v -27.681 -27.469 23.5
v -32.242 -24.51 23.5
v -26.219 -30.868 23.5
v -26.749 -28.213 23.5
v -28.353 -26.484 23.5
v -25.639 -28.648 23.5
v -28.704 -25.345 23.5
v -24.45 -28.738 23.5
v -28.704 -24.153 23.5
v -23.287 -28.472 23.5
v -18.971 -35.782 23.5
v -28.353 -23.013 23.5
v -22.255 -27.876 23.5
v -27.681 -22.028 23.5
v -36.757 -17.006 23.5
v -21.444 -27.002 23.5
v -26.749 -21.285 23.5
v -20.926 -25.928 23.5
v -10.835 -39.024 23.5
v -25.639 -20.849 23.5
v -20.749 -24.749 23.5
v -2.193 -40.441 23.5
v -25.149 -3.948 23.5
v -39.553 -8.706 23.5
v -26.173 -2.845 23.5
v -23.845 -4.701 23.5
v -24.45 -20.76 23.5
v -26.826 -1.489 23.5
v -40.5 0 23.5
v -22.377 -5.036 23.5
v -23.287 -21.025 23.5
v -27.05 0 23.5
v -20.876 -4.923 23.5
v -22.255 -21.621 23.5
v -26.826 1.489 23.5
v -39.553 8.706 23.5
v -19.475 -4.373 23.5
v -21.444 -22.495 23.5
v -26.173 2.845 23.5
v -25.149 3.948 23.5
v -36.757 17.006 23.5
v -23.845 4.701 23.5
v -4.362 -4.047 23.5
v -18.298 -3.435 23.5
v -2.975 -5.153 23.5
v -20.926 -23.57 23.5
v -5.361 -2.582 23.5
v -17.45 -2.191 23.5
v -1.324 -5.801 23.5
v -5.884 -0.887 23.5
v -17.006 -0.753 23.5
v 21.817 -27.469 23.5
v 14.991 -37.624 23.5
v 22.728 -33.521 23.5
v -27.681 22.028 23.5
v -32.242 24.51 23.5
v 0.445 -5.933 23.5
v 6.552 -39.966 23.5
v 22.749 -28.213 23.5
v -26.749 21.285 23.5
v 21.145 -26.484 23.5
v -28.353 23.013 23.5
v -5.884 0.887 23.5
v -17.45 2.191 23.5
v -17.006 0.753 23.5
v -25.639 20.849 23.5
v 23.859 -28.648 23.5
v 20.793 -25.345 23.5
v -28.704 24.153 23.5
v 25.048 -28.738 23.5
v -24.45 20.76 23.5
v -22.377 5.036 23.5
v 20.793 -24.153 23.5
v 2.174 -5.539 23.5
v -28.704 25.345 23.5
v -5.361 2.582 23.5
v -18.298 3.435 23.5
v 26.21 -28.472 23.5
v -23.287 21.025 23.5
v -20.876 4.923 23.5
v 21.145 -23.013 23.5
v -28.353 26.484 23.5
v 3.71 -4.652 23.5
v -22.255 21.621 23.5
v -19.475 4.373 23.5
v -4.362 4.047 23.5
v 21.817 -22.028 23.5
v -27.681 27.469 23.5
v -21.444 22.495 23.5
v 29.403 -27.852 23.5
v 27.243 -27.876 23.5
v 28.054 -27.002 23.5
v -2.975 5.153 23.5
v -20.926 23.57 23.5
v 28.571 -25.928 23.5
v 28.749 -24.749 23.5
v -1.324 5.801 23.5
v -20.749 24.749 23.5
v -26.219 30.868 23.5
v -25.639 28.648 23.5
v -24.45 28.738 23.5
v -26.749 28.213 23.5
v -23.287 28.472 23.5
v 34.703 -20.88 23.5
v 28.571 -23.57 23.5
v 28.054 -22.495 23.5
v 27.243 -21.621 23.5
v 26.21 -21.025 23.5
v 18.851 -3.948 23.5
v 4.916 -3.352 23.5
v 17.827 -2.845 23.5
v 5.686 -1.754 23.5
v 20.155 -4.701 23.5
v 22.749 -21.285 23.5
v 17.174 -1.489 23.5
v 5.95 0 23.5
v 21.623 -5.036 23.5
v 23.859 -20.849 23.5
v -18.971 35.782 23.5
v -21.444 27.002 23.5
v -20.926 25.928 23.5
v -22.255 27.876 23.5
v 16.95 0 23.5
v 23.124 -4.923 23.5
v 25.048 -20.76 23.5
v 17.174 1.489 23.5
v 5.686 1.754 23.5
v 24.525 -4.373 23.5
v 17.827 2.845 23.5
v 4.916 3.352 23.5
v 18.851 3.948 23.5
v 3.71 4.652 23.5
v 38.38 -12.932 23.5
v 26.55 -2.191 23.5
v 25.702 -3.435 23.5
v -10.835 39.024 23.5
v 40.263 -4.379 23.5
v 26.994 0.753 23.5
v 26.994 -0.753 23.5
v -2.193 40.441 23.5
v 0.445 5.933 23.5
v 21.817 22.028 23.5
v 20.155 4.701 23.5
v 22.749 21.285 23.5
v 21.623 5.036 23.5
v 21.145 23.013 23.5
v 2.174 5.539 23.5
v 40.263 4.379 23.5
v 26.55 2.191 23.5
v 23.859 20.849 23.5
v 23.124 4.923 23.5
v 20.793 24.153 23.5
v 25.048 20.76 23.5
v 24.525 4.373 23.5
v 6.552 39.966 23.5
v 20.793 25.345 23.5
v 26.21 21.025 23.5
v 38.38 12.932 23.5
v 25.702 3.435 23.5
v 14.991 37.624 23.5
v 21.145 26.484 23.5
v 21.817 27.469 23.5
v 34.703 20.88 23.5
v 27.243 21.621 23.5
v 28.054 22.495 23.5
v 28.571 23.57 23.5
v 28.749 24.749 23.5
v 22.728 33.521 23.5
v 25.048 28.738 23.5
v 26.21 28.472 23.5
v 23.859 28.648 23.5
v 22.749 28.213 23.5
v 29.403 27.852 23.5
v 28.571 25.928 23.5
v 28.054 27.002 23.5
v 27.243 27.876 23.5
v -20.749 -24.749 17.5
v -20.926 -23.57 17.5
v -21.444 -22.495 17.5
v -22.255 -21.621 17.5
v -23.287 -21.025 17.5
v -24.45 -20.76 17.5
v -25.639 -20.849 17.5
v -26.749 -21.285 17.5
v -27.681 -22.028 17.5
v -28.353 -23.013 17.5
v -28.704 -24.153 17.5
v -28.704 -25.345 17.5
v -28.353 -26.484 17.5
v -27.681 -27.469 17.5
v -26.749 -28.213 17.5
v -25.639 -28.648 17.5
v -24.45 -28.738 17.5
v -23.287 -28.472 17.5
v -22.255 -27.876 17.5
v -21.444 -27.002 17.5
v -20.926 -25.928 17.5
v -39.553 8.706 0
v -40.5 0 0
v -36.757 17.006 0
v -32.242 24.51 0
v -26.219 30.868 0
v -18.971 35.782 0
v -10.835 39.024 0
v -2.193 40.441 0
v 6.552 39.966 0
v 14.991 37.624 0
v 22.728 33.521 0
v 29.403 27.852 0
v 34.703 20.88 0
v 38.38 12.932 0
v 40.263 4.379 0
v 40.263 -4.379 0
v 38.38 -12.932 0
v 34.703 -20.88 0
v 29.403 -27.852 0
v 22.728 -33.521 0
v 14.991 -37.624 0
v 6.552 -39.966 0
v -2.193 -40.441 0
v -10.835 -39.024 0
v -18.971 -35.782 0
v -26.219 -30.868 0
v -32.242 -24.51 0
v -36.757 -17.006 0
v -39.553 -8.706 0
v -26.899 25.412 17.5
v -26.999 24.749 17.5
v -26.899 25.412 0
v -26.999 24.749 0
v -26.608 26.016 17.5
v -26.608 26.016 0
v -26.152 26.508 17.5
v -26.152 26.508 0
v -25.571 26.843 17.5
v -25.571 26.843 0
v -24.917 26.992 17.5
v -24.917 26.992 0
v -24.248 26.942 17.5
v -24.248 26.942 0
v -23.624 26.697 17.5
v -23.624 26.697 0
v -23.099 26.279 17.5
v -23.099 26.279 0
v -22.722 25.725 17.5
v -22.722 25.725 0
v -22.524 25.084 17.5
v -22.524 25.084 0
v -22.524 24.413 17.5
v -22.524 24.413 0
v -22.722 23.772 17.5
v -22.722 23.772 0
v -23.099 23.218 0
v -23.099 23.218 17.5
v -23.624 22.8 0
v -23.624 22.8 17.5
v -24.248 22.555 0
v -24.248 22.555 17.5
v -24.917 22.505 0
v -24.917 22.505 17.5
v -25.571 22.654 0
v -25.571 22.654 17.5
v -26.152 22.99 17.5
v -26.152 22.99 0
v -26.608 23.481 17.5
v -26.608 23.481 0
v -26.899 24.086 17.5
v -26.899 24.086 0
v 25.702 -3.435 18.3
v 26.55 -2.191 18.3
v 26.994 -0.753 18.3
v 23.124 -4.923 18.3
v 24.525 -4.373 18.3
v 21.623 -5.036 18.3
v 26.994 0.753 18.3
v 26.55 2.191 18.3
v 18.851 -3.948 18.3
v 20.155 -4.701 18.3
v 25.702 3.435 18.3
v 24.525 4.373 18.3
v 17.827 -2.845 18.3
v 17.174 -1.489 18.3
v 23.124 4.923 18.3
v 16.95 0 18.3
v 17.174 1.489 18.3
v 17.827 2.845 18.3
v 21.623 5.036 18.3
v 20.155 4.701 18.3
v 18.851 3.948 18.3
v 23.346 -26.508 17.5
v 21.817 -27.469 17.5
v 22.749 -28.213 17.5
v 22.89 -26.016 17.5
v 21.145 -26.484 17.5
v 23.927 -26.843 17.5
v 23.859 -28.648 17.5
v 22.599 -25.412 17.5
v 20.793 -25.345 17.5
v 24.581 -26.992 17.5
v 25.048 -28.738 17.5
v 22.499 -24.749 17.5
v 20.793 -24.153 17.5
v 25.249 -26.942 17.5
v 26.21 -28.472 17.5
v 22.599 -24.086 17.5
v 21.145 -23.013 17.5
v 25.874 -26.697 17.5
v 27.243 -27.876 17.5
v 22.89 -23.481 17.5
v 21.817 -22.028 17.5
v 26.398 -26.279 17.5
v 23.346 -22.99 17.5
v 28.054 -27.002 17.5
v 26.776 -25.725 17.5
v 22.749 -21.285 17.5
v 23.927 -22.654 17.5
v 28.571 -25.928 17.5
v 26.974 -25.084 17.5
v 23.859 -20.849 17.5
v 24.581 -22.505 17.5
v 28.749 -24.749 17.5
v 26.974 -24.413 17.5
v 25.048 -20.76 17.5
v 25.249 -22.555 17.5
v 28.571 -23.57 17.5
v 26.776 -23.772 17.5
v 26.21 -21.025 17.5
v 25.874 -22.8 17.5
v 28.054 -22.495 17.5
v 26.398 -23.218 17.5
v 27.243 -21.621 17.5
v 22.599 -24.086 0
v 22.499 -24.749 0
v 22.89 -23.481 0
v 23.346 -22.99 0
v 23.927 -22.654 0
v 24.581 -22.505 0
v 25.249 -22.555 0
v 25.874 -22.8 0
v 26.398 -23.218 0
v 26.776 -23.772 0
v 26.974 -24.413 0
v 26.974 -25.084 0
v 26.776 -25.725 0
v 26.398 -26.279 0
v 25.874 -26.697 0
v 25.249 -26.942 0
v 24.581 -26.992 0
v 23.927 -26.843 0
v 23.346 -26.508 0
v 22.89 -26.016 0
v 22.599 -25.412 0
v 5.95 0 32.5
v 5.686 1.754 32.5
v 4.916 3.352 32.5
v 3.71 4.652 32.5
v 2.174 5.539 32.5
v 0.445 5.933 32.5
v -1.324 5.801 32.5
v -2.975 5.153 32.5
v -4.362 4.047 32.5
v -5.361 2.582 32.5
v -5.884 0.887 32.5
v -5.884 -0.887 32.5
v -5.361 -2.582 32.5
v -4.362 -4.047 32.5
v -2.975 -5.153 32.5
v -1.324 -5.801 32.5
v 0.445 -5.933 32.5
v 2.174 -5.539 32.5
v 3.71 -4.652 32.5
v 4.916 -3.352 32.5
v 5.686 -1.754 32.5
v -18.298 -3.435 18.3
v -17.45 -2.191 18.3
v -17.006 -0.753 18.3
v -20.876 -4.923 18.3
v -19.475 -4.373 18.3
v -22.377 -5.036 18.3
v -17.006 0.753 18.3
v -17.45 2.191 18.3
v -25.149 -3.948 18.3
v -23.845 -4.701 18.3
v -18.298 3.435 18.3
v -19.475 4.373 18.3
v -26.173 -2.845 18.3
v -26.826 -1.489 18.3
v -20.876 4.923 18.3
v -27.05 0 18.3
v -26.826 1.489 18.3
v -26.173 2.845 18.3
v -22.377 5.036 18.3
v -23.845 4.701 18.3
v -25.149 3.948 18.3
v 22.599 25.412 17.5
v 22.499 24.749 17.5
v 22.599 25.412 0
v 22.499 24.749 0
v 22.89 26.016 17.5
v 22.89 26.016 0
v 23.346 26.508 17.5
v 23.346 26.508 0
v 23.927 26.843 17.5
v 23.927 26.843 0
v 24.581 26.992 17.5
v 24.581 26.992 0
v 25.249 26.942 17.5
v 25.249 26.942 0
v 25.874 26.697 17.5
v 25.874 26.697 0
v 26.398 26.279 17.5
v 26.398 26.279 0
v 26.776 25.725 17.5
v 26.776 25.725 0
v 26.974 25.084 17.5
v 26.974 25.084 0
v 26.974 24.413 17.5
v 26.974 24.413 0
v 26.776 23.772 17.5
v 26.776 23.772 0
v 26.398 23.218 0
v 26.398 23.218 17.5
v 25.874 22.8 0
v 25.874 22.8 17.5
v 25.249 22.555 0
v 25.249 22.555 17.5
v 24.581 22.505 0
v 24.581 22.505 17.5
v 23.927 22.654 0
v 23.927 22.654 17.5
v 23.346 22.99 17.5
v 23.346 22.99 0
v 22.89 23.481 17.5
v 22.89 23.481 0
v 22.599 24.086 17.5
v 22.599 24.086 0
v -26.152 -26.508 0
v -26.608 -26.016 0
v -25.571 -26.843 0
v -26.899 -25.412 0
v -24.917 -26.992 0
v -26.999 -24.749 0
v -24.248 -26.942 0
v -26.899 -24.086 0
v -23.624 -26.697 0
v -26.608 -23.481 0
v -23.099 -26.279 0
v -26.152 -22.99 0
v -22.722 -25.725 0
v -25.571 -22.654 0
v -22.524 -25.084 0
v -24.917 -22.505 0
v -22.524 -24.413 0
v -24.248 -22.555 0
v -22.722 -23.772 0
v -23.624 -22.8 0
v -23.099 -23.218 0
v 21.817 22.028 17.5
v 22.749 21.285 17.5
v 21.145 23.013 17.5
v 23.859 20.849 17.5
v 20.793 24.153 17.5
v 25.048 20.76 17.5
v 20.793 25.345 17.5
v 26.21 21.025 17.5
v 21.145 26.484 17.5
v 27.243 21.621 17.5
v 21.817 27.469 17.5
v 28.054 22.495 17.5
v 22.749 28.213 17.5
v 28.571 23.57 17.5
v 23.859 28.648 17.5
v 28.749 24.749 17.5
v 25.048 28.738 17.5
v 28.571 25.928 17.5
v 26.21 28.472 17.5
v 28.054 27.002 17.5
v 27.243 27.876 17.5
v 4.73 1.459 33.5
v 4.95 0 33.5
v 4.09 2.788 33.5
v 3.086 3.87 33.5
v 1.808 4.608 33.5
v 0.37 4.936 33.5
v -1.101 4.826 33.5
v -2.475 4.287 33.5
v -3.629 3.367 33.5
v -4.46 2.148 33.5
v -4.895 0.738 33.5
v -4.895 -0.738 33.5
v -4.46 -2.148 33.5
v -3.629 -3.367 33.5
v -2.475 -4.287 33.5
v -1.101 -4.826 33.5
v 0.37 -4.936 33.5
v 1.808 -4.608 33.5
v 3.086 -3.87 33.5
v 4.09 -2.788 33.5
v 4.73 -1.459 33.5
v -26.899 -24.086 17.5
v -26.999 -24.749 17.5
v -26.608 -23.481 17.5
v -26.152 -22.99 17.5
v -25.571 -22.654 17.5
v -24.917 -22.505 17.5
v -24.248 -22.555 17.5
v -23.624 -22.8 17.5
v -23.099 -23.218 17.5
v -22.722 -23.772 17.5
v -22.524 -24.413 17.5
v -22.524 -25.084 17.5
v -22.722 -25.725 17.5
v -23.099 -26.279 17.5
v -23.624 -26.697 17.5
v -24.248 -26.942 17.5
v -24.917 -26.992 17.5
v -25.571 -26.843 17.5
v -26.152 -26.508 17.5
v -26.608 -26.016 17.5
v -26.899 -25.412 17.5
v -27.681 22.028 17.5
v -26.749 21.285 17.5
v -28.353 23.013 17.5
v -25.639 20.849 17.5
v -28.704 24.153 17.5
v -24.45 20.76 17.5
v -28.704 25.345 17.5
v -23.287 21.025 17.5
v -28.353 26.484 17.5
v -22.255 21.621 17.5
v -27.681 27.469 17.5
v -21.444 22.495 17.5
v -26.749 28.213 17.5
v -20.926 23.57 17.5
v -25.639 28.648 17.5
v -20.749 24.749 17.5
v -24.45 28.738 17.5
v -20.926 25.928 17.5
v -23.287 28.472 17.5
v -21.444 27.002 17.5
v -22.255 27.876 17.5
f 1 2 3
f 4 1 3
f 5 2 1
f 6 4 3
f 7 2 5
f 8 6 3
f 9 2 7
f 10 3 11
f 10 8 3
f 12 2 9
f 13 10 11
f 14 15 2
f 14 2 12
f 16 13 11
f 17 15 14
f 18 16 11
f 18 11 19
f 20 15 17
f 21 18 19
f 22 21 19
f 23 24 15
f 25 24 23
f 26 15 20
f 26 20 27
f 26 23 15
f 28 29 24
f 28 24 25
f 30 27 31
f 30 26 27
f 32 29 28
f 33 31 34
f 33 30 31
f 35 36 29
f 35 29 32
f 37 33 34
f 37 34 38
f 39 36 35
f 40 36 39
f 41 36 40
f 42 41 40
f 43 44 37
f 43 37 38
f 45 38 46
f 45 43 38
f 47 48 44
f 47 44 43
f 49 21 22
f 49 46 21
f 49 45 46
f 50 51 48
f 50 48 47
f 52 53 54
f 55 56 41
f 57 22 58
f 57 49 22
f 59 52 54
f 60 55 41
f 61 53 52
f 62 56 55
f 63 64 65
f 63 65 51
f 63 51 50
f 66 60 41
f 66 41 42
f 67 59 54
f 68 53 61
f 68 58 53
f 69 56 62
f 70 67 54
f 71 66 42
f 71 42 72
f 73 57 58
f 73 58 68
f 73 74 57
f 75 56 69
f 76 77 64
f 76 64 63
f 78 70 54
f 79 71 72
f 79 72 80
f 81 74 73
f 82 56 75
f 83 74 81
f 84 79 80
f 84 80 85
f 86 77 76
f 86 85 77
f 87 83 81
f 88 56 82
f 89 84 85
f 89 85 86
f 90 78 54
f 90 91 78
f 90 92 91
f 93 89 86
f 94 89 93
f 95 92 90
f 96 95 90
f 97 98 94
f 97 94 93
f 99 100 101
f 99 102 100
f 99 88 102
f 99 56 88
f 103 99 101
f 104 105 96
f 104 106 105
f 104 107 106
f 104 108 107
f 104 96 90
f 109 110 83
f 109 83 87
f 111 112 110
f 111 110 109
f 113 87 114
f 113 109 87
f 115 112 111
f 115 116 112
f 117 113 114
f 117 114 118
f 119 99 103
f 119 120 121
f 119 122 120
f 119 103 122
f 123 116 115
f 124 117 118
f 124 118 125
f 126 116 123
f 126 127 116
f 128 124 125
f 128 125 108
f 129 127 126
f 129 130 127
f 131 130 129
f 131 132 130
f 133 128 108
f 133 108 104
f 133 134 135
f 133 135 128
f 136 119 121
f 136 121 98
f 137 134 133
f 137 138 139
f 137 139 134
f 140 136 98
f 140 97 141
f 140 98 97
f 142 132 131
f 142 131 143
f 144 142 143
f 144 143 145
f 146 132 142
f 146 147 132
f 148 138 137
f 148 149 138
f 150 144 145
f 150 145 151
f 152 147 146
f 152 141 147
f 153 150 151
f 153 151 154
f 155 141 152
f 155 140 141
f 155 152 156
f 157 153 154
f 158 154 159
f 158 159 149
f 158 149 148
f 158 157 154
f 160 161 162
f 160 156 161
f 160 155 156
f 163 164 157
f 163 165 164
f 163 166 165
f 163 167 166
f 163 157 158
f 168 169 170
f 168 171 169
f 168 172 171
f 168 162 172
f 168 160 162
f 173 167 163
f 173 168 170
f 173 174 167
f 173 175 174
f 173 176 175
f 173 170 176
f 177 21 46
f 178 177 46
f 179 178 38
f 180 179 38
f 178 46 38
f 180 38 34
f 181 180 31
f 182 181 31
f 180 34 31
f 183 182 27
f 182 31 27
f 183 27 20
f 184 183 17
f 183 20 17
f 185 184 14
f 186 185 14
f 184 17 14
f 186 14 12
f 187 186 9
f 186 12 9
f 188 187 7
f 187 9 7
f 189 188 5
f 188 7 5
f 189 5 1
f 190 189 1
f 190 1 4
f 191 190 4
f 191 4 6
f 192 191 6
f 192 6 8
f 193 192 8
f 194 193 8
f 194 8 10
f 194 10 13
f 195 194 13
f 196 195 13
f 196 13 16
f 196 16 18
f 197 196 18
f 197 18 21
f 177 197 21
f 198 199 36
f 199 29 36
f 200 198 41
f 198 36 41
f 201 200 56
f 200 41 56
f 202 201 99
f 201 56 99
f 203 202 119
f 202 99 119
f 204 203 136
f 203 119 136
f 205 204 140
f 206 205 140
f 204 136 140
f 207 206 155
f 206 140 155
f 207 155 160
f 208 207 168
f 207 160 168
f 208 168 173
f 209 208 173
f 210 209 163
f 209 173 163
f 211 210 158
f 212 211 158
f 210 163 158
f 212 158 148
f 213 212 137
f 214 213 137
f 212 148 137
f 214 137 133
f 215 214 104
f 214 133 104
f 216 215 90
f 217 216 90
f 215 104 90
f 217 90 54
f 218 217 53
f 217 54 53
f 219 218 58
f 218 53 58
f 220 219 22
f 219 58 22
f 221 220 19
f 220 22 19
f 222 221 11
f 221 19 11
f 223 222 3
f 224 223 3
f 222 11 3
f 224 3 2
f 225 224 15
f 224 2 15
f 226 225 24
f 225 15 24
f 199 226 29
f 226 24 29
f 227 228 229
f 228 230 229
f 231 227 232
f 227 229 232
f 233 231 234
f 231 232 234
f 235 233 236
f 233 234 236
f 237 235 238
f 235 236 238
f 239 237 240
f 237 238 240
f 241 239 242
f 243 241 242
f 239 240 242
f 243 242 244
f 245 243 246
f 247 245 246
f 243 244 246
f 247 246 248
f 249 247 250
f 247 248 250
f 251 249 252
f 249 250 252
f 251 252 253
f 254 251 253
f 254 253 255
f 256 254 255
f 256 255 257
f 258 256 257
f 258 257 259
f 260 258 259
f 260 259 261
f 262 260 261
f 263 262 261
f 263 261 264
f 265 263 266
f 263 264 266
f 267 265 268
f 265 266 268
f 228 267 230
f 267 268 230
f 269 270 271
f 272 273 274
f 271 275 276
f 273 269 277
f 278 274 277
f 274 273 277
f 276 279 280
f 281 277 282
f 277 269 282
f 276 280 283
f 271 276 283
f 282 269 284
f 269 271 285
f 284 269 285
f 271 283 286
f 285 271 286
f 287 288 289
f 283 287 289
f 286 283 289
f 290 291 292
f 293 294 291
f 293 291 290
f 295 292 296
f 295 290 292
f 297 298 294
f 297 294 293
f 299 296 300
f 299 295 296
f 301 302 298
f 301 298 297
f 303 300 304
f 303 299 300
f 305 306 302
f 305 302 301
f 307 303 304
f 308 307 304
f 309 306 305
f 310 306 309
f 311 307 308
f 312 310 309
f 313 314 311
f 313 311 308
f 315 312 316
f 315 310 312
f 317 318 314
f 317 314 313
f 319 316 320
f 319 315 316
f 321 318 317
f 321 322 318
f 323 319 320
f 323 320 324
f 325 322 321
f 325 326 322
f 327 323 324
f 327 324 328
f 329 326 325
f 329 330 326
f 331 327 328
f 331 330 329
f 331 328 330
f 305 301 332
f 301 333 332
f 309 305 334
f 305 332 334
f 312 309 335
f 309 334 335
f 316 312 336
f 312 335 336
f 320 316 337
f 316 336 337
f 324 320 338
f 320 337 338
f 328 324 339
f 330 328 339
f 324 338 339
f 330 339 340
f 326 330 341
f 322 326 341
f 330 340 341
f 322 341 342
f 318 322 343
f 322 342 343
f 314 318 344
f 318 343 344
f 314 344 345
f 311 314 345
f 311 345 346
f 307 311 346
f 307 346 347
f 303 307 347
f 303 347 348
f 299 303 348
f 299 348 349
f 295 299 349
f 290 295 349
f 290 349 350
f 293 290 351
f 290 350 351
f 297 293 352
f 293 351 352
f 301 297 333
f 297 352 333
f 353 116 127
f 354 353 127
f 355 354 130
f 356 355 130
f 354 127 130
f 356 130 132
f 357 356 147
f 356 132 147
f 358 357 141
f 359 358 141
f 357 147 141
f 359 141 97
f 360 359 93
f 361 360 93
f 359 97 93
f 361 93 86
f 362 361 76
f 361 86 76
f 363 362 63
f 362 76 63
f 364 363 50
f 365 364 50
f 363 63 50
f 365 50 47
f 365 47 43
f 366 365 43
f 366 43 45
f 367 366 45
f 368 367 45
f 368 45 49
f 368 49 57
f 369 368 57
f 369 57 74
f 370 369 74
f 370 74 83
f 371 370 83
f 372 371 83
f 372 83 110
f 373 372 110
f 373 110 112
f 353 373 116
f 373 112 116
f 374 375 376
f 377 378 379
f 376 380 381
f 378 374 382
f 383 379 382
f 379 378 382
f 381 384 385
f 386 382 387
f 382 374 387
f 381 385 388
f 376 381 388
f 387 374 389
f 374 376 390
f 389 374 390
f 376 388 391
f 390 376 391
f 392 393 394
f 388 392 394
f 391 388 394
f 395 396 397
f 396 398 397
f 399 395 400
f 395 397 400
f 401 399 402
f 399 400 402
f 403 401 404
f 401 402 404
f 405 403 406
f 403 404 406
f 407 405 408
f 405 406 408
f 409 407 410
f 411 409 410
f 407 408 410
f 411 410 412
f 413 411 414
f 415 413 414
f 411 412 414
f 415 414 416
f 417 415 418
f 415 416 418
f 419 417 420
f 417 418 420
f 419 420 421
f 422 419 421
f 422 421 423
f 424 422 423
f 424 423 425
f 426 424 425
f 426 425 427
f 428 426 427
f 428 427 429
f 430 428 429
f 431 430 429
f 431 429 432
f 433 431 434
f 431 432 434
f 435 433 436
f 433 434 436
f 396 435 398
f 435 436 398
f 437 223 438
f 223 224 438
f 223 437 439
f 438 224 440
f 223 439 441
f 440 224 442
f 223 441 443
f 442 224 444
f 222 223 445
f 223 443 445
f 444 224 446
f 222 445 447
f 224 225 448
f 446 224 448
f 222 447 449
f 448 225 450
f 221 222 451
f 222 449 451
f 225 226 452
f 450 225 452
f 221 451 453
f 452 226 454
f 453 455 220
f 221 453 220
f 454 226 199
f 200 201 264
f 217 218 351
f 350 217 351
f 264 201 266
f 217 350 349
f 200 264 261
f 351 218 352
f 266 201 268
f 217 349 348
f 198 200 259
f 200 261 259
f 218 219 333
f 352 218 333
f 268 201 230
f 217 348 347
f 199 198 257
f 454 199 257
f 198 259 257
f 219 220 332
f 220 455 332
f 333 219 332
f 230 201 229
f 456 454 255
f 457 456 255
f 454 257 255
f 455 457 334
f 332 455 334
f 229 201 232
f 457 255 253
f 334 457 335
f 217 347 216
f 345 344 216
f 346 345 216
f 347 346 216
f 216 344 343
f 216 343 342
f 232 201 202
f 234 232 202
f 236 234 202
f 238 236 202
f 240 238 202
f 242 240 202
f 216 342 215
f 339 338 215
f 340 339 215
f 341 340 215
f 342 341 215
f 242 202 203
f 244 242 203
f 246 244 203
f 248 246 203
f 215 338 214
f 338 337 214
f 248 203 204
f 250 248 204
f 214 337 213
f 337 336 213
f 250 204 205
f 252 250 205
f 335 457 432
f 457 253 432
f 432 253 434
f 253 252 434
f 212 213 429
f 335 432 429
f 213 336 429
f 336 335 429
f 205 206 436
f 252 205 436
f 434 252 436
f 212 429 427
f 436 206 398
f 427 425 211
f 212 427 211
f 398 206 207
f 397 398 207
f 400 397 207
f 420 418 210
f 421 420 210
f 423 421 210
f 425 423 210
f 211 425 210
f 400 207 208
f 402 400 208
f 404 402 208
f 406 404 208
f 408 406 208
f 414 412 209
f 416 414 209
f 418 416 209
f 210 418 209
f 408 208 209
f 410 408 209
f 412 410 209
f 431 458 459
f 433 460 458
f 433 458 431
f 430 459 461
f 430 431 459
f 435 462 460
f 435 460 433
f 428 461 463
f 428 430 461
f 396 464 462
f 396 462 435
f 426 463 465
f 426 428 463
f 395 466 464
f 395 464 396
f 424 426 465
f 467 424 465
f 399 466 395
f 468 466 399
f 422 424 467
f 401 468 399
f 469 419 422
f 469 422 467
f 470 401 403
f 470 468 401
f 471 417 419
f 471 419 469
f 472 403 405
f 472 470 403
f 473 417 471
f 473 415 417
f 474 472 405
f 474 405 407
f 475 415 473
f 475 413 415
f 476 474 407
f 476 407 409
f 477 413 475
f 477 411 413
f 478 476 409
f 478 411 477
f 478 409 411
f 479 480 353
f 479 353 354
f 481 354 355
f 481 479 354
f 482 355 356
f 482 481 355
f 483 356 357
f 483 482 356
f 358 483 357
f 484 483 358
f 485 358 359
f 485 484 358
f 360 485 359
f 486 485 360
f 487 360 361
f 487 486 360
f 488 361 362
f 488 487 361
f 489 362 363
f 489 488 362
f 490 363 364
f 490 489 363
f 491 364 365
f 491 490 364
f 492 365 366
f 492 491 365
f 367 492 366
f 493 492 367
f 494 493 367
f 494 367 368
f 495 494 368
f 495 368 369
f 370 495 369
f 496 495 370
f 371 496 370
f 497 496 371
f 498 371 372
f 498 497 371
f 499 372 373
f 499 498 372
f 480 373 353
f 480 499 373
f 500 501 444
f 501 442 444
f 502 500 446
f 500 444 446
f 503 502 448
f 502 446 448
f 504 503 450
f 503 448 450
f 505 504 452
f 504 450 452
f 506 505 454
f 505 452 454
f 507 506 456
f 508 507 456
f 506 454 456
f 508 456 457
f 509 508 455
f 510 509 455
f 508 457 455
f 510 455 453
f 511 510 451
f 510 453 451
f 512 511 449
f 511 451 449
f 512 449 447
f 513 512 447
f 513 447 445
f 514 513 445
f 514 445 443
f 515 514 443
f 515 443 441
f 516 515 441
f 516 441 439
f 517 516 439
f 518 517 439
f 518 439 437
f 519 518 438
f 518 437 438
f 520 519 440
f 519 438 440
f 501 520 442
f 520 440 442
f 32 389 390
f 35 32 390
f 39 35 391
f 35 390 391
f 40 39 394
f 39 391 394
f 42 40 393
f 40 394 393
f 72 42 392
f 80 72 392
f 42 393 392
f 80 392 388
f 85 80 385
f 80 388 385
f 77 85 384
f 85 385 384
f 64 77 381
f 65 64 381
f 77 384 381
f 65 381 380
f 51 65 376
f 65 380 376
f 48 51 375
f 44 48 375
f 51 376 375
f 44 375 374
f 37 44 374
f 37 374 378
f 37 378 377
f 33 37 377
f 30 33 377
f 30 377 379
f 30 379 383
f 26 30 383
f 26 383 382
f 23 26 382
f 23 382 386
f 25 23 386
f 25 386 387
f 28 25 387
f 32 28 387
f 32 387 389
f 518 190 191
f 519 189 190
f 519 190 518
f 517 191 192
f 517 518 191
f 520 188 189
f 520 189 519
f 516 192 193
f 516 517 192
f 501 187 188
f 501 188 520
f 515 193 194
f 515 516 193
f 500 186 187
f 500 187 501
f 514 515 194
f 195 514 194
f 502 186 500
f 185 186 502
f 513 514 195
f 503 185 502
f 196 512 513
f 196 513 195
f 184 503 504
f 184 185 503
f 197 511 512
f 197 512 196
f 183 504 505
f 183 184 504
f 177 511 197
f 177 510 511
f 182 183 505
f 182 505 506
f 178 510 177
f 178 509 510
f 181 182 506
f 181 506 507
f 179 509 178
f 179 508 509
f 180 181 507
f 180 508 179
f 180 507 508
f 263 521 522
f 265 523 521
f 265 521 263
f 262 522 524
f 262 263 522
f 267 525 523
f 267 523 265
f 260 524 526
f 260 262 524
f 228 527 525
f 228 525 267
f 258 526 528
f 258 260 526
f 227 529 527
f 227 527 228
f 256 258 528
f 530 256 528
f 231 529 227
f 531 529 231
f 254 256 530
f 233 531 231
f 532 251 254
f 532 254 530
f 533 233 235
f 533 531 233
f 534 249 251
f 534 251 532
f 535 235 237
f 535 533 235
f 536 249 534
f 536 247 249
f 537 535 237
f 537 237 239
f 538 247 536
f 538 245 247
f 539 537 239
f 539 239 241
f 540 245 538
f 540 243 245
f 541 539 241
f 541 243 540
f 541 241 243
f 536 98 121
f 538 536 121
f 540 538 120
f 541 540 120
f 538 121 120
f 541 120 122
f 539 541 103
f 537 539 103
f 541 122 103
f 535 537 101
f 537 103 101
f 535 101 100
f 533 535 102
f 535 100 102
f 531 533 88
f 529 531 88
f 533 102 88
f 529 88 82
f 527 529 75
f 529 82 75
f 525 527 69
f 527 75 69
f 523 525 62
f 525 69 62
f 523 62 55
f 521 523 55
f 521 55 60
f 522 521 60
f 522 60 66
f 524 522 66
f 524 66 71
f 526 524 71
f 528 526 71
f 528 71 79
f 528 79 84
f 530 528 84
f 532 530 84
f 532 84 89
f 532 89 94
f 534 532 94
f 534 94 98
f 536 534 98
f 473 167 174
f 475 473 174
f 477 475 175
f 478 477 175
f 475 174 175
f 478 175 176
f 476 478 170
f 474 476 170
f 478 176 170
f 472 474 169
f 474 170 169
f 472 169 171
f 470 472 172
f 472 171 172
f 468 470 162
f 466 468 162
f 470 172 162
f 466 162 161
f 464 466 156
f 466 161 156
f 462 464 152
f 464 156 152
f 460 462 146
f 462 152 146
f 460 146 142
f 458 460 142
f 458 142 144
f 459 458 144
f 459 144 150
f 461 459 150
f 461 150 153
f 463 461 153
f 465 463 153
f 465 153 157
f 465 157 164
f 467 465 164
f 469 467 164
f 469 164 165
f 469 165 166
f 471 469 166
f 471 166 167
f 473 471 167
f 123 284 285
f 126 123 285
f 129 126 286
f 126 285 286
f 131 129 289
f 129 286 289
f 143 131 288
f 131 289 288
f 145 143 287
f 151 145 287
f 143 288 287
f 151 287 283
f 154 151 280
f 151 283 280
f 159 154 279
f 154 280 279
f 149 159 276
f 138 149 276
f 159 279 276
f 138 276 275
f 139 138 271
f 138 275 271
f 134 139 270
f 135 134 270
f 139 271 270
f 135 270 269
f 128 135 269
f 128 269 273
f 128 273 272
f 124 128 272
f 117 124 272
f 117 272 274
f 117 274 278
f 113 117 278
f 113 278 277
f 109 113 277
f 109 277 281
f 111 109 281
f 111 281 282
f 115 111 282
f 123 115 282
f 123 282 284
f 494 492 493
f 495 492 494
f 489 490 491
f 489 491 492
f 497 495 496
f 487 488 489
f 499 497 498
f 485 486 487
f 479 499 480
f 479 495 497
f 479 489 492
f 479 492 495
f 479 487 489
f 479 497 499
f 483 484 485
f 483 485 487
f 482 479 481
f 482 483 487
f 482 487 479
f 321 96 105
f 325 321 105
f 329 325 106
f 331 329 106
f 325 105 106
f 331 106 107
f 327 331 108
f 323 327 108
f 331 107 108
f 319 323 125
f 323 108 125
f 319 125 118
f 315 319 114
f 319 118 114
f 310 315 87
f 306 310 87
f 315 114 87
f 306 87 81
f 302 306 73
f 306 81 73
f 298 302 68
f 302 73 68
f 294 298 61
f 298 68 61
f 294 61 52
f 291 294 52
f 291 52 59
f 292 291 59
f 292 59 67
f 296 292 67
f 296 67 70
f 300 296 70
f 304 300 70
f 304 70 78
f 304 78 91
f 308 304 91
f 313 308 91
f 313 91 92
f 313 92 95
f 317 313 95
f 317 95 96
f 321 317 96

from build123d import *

# Parameters (mm, degrees)
SKETCH1_W                                        = 40.5
SKETCH1_H                                        = 23.5
SKETCH2_R                                        = 5.95
BOSS_EXTRUDE1_DEPTH                              = 10
HOLE1_D                                          = 10.1
HOLE1_DEPTH                                      = 5.2
CBORE_FOR_M4_HEX_HEAD_MACHINE_SCREW1_D           = 4.5
CBORE_FOR_M4_HEX_HEAD_MACHINE_SCREW1_CBORE_D     = 8
CBORE_FOR_M4_HEX_HEAD_MACHINE_SCREW1_CBORE_DEPTH = 6
CHAMFER1_SIZE                                    = 1


with BuildPart() as part:
    # Sketch1 → Revolve1 (revolve)
    with BuildSketch(Plane.XZ, mode=Mode.PRIVATE) as revolve1_sk:
        with Locations((20.25, 11.75)):
            Rectangle(SKETCH1_W, SKETCH1_H)
    revolve(revolve1_sk.sketch.rotate(Axis((0, 0, 23.5), (0, 0, -1)), 180), axis=Axis((0, 0, 23.5), (0, 0, -1)))

    # Sketch2 → Boss-Extrude1 (add)
    with BuildSketch(Plane.XY.offset(23.5)):
        Circle(SKETCH2_R)
    extrude(amount=BOSS_EXTRUDE1_DEPTH)

    # Hole1
    with Locations(Plane.XY.offset(23.5)):
        with Locations((22, 0), (-22, 0)):
            Hole(HOLE1_D / 2, depth=HOLE1_DEPTH)

    # CBORE for M4 Hex Head Machine Screw1 (through all)
    with Locations(Plane.XY.offset(23.5)):
        with Locations((24.748737342, 24.748737342), (-24.748737342, 24.748737342), (24.748737342, -24.748737342), (-24.748737342, -24.748737342)):
            CounterBoreHole(CBORE_FOR_M4_HEX_HEAD_MACHINE_SCREW1_D / 2, CBORE_FOR_M4_HEX_HEAD_MACHINE_SCREW1_CBORE_D / 2, CBORE_FOR_M4_HEX_HEAD_MACHINE_SCREW1_CBORE_DEPTH)

    # Chamfer1
    chamfer1_edges = [part.edges().sort_by_distance(p)[0] for p in [
        (-5.95, 0, 33.5),
    ]]
    chamfer(chamfer1_edges, length=CHAMFER1_SIZE)


solid = part.part
